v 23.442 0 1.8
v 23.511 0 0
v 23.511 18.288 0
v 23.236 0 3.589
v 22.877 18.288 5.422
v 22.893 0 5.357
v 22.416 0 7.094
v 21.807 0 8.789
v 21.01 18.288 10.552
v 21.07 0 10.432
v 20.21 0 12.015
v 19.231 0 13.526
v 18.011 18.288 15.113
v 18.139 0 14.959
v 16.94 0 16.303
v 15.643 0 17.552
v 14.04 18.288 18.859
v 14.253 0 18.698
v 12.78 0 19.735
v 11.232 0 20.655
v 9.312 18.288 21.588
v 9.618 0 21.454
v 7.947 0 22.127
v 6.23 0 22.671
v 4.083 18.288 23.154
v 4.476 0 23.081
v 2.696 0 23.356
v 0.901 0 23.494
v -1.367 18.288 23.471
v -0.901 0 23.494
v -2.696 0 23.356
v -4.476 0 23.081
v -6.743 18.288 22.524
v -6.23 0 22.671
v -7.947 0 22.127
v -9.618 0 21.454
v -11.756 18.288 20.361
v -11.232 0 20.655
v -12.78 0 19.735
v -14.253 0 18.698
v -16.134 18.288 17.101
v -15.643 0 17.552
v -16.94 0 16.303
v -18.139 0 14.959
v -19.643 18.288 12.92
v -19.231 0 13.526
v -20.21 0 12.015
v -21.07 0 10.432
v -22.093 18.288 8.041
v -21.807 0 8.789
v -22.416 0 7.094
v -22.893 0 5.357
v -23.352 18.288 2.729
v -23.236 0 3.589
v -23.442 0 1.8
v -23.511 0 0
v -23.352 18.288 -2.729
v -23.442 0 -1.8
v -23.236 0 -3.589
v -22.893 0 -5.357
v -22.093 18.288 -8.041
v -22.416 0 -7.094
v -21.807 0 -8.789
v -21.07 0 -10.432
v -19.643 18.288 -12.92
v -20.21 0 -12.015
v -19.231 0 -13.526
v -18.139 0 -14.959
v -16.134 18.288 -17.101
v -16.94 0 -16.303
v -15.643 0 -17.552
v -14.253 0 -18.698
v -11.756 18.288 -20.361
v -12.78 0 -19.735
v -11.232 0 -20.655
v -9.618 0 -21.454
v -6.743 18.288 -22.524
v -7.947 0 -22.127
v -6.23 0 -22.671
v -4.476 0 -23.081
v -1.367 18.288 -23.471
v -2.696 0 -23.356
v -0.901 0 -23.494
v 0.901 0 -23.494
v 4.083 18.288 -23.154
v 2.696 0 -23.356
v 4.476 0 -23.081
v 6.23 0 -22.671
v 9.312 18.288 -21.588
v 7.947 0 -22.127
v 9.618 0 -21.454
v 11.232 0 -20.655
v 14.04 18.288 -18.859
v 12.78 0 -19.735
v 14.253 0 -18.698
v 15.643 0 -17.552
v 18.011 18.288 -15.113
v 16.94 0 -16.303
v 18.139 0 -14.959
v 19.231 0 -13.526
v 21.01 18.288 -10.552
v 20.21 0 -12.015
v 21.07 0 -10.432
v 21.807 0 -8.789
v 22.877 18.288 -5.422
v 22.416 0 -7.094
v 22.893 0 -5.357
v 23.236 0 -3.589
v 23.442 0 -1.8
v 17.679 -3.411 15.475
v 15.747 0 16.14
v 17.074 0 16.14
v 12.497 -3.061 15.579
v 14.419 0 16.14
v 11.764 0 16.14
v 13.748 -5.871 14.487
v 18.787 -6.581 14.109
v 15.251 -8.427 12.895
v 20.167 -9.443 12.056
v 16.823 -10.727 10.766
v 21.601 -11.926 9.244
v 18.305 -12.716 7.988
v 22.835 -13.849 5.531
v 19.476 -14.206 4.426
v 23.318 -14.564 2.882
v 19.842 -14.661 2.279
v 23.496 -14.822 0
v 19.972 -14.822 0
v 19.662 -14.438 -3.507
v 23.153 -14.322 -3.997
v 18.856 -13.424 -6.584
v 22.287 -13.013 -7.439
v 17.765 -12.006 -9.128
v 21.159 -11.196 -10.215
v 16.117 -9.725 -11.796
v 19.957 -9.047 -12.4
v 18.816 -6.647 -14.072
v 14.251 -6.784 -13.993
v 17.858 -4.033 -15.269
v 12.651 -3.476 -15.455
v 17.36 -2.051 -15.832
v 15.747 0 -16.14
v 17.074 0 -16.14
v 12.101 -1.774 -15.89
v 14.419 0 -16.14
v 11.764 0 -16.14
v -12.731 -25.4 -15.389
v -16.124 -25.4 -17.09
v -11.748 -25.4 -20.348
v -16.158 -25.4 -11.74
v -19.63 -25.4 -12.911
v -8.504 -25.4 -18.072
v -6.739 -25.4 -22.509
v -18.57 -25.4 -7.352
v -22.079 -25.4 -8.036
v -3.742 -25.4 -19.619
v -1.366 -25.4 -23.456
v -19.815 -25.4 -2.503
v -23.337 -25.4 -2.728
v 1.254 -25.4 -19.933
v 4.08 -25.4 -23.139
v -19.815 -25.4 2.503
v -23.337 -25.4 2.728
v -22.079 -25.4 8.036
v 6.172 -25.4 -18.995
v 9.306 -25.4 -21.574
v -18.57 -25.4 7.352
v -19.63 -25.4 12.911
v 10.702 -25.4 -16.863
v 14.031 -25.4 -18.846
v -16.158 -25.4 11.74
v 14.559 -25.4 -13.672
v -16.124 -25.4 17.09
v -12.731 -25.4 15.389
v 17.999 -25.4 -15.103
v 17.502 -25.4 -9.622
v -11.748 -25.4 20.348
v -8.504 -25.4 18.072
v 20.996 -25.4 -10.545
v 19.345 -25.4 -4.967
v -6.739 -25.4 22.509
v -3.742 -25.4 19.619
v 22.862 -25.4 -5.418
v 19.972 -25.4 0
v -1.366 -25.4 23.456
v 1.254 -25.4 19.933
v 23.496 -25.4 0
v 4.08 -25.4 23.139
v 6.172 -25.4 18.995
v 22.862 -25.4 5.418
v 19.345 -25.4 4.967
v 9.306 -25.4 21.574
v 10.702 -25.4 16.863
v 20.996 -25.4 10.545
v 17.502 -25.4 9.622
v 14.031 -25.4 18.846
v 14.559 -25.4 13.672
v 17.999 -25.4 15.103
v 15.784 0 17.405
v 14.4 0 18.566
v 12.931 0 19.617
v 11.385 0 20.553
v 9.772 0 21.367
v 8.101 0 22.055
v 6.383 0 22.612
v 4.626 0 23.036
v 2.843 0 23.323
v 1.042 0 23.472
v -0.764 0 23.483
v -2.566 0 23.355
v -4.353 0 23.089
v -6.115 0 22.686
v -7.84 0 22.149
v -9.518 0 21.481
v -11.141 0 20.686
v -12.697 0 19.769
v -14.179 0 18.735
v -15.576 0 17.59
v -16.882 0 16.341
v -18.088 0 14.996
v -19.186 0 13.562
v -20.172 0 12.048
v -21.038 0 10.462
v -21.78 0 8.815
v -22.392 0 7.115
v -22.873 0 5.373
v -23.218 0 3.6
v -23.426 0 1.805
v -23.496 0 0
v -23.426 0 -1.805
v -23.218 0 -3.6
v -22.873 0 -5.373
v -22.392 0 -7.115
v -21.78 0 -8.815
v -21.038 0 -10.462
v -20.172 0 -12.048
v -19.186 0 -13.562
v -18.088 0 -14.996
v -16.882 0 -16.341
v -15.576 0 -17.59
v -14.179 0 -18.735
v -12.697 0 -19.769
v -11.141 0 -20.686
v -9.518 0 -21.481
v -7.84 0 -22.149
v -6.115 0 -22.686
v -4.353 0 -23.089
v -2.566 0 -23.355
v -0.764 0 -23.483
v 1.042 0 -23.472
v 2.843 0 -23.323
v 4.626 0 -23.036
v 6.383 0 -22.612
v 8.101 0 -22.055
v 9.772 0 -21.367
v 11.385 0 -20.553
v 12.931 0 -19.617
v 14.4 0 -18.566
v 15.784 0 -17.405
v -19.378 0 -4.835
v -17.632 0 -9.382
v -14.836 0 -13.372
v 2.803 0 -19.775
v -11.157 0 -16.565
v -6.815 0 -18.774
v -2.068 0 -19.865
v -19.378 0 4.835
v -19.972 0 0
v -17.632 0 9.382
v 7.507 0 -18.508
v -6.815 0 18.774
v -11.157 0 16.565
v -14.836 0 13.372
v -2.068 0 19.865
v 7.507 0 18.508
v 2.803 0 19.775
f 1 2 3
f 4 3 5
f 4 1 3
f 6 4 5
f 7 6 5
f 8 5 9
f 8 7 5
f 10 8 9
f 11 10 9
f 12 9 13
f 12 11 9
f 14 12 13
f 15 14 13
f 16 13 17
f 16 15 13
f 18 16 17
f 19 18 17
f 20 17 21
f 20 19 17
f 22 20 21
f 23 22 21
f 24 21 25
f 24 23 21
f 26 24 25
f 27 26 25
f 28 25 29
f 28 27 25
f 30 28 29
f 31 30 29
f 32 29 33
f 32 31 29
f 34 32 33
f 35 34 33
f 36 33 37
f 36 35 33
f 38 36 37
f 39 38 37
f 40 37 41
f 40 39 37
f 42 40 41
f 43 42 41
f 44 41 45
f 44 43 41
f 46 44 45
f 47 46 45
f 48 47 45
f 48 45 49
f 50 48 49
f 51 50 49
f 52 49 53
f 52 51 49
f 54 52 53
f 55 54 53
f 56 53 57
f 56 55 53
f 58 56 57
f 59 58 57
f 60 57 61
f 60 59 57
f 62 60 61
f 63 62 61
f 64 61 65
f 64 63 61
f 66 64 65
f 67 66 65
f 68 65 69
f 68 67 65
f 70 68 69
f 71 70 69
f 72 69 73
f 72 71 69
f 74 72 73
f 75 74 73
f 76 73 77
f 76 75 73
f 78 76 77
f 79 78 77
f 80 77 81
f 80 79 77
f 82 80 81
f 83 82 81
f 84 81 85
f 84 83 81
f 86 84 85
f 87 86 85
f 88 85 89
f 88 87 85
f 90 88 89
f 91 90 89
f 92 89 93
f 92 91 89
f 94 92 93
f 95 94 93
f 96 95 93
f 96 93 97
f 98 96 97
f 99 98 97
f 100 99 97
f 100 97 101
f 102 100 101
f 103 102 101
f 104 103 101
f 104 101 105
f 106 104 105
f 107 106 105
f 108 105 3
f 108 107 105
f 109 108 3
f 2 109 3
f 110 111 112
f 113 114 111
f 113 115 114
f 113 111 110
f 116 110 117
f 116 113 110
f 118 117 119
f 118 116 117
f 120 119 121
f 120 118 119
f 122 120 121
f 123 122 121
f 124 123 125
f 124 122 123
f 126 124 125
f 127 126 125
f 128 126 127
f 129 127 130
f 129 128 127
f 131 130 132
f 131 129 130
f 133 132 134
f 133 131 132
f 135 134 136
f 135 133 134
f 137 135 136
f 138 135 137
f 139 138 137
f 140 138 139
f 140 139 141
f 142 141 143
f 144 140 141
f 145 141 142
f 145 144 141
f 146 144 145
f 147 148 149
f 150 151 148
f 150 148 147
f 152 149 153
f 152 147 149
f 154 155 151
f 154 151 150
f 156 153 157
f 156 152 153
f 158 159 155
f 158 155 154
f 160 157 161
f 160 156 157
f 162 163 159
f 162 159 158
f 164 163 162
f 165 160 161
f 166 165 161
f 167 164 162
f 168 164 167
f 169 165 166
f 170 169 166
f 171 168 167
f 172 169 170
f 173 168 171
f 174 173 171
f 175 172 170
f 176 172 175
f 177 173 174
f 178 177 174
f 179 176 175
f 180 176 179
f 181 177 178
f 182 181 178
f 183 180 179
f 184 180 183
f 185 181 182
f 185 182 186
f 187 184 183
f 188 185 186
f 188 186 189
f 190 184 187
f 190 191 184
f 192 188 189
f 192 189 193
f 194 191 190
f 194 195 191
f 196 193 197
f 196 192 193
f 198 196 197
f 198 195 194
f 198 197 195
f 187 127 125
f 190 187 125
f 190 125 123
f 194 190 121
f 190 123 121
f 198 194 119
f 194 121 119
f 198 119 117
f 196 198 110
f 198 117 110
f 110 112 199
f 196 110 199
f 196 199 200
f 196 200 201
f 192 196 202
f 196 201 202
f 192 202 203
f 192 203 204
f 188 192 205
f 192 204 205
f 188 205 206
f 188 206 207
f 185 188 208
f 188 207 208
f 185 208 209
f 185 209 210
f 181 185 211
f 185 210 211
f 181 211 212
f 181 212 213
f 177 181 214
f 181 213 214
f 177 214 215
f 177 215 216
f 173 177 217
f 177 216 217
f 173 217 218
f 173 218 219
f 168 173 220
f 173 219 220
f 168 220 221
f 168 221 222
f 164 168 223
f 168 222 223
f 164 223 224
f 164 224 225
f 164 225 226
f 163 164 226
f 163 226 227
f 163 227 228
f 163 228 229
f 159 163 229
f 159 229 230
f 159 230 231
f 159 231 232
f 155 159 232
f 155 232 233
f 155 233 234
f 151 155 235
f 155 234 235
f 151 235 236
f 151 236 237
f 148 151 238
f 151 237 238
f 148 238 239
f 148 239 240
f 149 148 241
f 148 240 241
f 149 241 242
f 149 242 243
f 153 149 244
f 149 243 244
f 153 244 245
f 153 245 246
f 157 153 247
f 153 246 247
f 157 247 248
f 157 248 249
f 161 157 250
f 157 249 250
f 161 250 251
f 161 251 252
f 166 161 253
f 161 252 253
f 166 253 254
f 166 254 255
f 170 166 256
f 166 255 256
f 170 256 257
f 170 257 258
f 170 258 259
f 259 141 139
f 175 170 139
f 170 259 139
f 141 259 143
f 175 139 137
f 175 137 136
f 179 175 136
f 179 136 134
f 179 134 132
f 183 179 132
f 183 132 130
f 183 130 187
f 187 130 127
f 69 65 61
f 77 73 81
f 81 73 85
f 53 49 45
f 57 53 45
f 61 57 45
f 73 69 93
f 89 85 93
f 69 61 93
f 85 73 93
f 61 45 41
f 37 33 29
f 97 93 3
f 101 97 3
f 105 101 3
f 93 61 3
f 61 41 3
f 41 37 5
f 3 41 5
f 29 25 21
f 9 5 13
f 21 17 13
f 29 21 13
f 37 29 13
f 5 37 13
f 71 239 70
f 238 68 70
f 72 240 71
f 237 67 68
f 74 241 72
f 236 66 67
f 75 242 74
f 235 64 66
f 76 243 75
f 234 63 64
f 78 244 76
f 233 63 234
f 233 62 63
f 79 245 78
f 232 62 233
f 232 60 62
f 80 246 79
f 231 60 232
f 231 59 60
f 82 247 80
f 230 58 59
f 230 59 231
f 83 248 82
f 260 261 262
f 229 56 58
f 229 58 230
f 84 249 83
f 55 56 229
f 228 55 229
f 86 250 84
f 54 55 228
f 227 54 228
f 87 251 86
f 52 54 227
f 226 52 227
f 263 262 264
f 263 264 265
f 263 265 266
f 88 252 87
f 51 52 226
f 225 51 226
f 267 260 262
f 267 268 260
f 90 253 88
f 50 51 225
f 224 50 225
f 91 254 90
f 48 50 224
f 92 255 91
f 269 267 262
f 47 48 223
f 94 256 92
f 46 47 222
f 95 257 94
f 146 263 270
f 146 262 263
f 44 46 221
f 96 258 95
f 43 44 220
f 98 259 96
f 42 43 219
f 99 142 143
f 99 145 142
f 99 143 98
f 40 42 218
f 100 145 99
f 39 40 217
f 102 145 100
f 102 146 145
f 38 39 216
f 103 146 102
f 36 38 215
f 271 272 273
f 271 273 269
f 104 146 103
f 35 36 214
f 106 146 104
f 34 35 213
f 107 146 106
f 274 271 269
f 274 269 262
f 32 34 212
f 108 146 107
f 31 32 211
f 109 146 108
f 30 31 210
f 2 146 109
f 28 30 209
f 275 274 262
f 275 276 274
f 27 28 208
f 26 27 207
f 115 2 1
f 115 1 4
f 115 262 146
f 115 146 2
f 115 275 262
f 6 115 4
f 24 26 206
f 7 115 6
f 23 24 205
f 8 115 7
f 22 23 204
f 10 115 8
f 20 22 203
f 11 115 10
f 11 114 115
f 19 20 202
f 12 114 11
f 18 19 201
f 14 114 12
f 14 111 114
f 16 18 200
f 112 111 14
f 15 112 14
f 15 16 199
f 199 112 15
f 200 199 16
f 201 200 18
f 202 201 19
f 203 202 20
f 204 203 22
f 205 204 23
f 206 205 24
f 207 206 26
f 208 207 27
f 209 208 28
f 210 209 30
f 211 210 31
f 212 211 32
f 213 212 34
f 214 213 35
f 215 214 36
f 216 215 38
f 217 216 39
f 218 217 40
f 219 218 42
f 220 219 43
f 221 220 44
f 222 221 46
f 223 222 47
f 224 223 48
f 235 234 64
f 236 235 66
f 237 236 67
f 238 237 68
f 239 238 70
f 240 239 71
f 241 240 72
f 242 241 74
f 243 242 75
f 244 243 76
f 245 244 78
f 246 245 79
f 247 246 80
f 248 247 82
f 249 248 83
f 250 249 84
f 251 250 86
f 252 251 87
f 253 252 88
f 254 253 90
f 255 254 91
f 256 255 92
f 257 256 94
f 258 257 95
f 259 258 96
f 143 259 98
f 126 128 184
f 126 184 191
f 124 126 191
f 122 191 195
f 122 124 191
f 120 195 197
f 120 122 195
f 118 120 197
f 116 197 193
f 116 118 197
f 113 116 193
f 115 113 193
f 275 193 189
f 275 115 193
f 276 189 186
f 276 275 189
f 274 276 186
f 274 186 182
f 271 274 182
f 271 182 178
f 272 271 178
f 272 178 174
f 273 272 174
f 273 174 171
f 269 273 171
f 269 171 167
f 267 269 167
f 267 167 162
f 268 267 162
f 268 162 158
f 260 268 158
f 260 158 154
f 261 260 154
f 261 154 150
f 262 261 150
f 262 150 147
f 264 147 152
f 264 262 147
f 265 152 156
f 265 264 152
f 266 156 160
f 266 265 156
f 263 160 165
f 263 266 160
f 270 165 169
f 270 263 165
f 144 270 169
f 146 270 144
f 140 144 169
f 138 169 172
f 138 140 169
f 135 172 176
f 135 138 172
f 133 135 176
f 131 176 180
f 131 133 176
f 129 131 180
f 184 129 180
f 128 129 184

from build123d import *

# Parameters (mm, degrees)
F0_R     = 23.495605
F1_DEPTH = 25.4
F2_R     = 19.972479
F3_DEPTH = 27.178
F4_R     = 16.198988
F5_DEPTH = 37.846
F6_R     = 23.51123
F7_DEPTH = 18.288


with BuildPart() as f1:
    # F0 (on Front) → F1 (new body)
    with BuildSketch(Plane.XZ):
        Circle(F0_R)
    extrude(amount=F1_DEPTH)

    # F2 (on Front) → F3 (cut)
    with BuildSketch(Plane.XZ):
        Circle(F2_R)
    extrude(amount=F3_DEPTH, mode=Mode.SUBTRACT)

    # F4 (on Right) → F5 (cut)
    with BuildSketch(Plane.YZ):
        with Locations((1.37669, 0)):
            Circle(F4_R)
    extrude(amount=F5_DEPTH, mode=Mode.SUBTRACT)

    # F6 (on Front) → F7 (join)
    with BuildSketch(Plane.XZ):
        Circle(F6_R)
    extrude(amount=-F7_DEPTH)


solid = f1.part
